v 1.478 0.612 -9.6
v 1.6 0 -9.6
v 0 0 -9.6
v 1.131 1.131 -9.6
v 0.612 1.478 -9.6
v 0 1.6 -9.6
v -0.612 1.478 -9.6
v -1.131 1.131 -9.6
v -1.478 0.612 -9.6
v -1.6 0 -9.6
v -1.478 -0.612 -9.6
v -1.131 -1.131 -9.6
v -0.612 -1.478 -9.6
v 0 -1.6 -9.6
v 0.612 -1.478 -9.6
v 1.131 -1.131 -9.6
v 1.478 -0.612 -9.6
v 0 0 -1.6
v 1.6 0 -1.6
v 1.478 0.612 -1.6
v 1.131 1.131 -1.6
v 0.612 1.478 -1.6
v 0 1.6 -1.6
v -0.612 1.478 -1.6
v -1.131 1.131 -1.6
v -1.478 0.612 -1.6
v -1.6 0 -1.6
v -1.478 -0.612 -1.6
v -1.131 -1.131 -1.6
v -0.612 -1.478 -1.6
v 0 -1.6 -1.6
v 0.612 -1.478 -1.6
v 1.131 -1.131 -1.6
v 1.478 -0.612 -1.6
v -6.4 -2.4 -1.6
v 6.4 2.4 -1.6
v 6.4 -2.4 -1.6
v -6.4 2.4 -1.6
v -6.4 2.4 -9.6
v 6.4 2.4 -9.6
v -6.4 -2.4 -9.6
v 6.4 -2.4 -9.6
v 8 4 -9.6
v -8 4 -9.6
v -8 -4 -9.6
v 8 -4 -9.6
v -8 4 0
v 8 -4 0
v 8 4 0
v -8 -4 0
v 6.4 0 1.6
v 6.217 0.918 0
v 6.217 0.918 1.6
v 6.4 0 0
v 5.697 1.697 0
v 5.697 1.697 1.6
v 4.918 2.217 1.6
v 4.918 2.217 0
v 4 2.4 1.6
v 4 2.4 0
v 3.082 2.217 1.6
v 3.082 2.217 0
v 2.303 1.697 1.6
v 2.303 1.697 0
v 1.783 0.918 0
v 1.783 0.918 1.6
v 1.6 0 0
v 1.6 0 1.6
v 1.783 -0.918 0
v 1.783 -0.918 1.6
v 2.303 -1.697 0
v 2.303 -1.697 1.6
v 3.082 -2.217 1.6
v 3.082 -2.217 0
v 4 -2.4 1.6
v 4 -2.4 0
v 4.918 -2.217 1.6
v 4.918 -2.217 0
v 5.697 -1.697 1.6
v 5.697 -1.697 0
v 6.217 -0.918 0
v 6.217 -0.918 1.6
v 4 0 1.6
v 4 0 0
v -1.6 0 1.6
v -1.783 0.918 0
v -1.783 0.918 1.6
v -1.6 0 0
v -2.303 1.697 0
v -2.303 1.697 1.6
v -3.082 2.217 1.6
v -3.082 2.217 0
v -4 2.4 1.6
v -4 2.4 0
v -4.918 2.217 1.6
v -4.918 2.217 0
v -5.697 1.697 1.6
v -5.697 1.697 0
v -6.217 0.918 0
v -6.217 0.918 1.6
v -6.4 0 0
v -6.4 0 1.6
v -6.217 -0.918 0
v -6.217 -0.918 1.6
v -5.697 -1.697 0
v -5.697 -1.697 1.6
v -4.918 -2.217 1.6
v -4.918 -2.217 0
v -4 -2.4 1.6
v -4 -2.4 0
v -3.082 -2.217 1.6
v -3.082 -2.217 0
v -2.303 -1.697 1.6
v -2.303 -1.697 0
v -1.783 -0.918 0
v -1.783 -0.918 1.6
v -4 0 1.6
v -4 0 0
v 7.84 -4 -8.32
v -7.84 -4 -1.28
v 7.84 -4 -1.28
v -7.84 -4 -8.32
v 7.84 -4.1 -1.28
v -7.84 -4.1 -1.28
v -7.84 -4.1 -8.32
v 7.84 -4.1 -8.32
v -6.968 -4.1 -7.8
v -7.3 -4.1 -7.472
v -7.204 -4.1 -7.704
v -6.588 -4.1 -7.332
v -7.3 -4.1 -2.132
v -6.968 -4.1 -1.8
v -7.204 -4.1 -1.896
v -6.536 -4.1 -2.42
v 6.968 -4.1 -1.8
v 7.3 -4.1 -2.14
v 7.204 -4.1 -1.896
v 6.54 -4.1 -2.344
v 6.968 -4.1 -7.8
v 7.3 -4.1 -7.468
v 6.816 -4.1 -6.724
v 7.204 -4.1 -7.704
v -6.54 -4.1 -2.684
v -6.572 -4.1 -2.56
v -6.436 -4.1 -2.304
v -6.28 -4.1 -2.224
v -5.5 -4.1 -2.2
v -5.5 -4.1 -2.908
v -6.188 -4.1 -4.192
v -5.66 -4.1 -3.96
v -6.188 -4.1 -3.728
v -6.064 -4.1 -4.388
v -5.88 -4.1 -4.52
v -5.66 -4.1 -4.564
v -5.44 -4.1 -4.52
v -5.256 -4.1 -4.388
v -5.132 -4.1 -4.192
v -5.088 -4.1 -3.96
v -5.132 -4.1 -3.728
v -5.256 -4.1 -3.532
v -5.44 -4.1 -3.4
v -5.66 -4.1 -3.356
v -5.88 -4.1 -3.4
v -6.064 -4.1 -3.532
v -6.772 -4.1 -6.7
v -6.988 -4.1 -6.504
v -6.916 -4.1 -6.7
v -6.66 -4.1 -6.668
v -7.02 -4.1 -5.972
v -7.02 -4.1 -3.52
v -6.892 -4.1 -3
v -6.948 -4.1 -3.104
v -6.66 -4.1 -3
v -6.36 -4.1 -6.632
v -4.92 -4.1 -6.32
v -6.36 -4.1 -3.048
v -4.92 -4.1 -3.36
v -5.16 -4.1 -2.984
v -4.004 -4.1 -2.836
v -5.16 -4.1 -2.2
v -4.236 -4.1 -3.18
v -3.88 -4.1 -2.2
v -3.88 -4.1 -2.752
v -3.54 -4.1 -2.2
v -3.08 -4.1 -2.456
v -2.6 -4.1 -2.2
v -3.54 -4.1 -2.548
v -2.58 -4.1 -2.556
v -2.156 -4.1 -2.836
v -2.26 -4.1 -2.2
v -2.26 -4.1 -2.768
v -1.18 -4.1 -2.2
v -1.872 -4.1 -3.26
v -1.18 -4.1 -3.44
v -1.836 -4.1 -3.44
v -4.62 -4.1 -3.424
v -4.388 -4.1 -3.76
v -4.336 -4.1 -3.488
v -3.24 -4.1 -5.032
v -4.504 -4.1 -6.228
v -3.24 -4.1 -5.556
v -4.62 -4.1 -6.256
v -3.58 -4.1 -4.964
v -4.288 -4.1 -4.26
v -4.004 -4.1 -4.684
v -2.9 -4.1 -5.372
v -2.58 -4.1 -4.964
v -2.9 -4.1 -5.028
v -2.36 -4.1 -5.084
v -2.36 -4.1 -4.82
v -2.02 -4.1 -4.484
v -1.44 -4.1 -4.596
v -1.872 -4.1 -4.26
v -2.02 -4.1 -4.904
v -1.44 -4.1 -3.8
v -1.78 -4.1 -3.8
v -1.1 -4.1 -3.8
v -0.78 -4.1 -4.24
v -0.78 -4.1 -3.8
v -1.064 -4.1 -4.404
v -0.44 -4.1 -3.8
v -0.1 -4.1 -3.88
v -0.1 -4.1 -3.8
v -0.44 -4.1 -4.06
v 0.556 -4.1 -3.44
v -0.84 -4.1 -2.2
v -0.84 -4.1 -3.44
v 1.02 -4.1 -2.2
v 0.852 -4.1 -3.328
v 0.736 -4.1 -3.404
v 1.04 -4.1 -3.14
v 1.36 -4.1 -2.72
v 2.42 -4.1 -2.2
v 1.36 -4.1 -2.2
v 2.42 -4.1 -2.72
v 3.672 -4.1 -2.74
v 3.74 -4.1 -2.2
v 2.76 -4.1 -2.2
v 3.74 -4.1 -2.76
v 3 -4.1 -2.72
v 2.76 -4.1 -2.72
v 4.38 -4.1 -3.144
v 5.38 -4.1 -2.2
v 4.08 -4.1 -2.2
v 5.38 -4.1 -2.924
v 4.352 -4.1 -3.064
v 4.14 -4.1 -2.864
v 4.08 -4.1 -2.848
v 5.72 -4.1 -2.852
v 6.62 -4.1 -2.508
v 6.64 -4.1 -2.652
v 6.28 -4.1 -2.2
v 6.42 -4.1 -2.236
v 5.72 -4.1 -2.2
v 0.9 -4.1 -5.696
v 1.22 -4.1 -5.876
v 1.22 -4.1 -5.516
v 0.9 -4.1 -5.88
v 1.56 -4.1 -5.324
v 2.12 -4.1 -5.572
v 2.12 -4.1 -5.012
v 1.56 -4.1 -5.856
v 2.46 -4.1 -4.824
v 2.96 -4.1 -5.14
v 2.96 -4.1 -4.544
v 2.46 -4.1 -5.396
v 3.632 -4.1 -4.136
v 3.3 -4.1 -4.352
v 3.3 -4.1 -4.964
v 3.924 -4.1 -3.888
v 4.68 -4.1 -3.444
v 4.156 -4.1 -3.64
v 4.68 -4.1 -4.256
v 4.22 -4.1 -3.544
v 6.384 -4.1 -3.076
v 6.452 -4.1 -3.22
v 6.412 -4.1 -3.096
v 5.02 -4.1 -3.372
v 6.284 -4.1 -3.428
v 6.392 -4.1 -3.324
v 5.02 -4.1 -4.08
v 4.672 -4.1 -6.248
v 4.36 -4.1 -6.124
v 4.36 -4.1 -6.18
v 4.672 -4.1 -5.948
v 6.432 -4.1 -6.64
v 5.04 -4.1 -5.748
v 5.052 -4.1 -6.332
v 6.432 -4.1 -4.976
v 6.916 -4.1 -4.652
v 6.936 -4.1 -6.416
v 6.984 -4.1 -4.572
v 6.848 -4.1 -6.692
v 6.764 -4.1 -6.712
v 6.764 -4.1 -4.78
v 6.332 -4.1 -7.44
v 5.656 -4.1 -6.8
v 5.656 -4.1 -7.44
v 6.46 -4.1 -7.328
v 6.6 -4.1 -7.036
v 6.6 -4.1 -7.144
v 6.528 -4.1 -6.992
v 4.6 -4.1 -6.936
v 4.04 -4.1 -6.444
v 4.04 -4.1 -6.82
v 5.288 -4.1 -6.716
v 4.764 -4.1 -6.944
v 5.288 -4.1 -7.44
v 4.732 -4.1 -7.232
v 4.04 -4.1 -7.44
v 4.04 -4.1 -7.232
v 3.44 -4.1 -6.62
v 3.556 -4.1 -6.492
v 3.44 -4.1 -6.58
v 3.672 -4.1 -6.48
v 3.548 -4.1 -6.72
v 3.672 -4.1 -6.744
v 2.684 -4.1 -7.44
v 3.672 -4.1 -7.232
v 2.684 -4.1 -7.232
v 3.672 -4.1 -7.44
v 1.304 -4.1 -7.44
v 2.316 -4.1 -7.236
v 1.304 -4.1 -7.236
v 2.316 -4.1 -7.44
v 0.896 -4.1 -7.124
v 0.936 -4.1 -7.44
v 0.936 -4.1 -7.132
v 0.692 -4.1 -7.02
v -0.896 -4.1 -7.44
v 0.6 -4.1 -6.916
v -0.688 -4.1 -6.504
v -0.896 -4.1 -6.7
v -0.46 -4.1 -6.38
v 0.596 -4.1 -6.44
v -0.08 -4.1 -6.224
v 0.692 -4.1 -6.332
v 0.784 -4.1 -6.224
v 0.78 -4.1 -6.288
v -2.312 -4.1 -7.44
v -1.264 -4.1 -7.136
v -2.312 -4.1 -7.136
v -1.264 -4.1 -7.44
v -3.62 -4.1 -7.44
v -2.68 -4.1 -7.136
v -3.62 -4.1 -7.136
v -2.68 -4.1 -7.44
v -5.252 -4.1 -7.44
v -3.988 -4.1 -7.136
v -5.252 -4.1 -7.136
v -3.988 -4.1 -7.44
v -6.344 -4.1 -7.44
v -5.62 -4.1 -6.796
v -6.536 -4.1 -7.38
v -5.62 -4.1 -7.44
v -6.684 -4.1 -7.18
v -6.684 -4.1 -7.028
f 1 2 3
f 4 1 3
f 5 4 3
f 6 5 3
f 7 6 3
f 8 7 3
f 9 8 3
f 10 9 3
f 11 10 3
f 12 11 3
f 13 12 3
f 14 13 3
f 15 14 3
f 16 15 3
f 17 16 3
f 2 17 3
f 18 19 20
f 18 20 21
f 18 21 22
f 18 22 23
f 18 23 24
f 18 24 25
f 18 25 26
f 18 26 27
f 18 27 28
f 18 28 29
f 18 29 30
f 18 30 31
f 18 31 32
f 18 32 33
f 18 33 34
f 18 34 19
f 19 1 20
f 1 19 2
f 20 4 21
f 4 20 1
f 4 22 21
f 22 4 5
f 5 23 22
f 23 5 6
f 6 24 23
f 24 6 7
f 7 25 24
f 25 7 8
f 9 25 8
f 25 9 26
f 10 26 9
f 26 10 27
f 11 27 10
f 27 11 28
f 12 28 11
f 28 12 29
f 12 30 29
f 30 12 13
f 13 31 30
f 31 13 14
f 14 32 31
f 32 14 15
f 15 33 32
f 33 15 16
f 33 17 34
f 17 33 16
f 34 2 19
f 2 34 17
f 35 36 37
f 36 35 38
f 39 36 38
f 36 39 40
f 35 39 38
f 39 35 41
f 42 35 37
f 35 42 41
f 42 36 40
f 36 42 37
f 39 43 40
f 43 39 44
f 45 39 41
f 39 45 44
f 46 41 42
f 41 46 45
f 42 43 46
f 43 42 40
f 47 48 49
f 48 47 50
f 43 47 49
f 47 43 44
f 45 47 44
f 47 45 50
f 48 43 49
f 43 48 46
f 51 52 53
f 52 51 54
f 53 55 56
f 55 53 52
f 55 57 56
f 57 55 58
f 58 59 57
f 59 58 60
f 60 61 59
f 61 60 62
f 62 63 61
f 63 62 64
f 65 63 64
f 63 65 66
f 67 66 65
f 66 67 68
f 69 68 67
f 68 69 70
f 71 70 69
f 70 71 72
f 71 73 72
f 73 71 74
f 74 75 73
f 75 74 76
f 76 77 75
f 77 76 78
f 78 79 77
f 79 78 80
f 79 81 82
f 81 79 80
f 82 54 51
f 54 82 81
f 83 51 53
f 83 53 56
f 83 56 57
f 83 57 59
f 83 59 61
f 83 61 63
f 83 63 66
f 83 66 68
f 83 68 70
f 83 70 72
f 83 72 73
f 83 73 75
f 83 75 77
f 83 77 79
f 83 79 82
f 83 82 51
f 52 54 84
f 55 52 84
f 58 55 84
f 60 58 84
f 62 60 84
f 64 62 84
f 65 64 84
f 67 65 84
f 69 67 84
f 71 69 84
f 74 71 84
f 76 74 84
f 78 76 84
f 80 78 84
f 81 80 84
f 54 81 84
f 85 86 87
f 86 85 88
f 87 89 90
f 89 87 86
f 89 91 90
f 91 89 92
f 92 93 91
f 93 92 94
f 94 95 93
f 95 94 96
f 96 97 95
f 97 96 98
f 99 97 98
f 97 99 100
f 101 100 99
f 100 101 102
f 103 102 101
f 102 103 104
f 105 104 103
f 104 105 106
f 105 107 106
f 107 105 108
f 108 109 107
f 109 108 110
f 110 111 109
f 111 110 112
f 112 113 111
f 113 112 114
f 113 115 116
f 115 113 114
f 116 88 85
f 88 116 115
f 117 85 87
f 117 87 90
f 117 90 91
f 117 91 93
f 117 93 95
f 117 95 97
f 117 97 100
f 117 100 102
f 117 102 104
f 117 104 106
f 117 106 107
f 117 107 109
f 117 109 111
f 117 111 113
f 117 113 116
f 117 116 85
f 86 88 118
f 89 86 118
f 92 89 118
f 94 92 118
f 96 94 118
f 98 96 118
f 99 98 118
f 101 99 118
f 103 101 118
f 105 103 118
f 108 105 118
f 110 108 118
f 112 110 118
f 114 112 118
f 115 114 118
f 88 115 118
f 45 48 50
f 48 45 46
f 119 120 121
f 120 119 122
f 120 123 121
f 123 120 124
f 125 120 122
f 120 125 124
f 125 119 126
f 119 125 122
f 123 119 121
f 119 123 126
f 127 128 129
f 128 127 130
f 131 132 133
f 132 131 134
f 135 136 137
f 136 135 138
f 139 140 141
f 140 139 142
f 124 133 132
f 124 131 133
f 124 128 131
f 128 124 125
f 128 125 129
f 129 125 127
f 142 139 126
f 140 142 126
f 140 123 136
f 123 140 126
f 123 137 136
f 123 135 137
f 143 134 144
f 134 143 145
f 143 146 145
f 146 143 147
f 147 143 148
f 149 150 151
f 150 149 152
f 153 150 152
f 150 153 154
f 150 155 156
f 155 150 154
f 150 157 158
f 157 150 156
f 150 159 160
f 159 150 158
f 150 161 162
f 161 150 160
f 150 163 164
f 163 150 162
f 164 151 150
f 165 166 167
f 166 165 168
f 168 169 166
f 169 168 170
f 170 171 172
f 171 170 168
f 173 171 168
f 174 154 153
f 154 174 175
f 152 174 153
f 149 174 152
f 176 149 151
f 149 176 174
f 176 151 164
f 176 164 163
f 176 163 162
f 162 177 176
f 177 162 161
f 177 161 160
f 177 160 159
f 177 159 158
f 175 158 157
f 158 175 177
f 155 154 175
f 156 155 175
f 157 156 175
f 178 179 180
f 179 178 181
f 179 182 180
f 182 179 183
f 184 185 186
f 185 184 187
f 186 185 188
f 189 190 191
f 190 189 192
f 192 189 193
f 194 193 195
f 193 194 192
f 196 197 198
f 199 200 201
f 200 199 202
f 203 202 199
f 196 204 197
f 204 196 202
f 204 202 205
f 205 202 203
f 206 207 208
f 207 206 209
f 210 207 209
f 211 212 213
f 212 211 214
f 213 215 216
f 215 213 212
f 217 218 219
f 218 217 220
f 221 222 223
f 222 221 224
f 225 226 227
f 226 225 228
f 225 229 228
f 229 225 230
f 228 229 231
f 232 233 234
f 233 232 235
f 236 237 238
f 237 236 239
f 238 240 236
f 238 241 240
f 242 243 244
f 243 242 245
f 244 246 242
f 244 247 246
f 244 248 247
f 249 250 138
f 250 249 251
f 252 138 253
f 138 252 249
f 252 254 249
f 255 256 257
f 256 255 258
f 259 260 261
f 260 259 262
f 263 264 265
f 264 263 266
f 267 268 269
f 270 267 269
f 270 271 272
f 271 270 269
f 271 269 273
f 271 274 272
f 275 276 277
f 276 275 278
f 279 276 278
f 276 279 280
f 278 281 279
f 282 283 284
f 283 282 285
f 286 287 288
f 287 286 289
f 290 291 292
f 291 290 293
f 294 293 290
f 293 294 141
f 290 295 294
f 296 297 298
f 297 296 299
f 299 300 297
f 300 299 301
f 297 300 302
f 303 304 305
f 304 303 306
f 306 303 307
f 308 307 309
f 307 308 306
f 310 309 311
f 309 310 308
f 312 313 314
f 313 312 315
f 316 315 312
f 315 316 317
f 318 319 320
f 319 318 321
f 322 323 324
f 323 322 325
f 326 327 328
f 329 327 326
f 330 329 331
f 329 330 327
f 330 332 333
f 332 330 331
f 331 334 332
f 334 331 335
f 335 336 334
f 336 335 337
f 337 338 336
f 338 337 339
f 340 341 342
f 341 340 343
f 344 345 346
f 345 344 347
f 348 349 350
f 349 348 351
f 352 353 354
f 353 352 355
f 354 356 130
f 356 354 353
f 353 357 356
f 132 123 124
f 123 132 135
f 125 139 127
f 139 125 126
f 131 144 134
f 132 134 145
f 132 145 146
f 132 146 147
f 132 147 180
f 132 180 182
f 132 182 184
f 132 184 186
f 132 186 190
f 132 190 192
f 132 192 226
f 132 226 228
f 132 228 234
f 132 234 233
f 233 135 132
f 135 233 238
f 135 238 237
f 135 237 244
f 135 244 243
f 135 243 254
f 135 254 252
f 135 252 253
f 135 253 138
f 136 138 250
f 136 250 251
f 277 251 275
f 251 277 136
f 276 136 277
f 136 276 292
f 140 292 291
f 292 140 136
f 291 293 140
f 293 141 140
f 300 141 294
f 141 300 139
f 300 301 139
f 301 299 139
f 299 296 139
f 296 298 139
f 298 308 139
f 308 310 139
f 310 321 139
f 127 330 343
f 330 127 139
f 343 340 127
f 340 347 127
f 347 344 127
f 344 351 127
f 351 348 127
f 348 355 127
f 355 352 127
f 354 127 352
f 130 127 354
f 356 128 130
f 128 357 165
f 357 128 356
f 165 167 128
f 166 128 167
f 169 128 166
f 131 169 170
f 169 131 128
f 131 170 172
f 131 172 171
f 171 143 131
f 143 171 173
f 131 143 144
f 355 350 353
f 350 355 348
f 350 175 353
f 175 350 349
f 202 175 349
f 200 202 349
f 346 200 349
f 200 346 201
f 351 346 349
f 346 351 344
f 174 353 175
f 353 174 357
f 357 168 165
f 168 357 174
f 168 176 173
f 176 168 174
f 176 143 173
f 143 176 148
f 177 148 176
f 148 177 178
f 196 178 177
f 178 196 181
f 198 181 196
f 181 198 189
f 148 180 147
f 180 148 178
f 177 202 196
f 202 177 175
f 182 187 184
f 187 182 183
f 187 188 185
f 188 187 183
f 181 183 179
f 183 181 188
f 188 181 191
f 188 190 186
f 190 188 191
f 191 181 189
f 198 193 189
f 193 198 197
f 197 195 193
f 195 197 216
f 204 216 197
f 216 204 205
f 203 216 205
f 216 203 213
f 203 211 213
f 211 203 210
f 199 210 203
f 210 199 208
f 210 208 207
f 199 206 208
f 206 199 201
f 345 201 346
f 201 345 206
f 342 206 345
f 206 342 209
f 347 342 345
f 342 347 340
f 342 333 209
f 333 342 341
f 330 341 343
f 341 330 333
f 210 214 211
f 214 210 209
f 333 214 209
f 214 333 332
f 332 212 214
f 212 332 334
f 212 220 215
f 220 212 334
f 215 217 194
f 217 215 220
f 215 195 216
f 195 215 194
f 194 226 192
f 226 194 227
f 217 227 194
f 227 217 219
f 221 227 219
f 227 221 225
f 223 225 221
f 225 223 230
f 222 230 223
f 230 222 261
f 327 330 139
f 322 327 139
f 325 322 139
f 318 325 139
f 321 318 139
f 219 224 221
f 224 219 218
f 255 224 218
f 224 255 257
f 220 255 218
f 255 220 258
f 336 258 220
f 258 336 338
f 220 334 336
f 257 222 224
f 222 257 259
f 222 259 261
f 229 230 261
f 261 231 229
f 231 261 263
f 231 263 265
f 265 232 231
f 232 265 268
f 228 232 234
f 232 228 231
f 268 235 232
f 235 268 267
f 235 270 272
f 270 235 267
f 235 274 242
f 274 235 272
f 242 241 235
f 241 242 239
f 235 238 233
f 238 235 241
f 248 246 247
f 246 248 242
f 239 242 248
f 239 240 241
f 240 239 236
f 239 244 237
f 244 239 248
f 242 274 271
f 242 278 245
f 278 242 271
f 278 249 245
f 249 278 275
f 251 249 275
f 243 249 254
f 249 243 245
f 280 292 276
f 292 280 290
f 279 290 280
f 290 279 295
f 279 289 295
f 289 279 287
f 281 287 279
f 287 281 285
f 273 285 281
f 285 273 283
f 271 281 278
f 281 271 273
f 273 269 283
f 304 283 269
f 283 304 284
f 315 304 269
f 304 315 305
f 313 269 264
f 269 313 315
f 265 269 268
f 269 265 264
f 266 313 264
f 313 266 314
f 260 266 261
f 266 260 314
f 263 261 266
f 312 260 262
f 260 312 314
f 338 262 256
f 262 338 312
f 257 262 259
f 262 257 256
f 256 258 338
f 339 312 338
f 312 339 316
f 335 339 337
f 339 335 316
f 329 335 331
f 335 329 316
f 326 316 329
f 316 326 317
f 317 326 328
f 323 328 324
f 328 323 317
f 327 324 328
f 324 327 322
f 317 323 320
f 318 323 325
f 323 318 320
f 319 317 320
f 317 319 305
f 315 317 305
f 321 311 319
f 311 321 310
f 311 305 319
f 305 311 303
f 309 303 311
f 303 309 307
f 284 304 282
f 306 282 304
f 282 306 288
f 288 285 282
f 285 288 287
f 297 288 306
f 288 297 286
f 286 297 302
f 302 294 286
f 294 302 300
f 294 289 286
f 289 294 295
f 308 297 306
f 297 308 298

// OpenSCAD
use <../lib.scad>
use <168365e.scad>
use <3004.scad>
function ldraw_lib__3004d18() = [
// 0 Brick  1 x  2 with Black, Yellow and Light Grey Stripes on White Background with Reflection Areas with Black Border Sticker
// 0 Name: 3004d18.dat
// 0 Author: Chris Böhnke [KnightOfTarenta]
// 0 !LDRAW_ORG Shortcut UPDATE 2025-02
// 0 !LICENSE Licensed under CC BY 4.0 : see CAreadme.txt
// 
// 0 BFC CERTIFY CCW
  [0,"BFC","CERTIFY"],
  [0,"BFC","CCW"],
// 
// 0 !CATEGORY Sticker Shortcut
// 0 !KEYWORDS Bricklink 3004pb094, BrickOwl 463921, headlight, Rebel Wrecker
// 0 !KEYWORDS Set 8858, Technic
// 
// 0 !HISTORY 2025-02-27 [OrionP] Official Update 2025-02
// 
// 1 16 0 0 0 1 0 0 0 1 0 0 0 1 3004.dat
  [1,16,0,0,0,1,0,0,0,1,0,0,0,1, ldraw_lib__3004()],
// 1 16 0 12 -10 1 0 0 0 0 -1 0 1 0 168365e.dat
  [1,16,0,12,-10,1,0,0,0,0,-1,0,1,0, ldraw_lib__168365e()],
];
module ldraw_lib__3004d18(step=0, col=false, unit=2/5, alt=false, line=0.2, solid=!$preview)
    makepoly(ldraw_lib__3004d18(), step=step, col=col, unit=unit, alt=alt, line=line, solid=solid);
ldraw_lib__3004d18(line=0.2);
